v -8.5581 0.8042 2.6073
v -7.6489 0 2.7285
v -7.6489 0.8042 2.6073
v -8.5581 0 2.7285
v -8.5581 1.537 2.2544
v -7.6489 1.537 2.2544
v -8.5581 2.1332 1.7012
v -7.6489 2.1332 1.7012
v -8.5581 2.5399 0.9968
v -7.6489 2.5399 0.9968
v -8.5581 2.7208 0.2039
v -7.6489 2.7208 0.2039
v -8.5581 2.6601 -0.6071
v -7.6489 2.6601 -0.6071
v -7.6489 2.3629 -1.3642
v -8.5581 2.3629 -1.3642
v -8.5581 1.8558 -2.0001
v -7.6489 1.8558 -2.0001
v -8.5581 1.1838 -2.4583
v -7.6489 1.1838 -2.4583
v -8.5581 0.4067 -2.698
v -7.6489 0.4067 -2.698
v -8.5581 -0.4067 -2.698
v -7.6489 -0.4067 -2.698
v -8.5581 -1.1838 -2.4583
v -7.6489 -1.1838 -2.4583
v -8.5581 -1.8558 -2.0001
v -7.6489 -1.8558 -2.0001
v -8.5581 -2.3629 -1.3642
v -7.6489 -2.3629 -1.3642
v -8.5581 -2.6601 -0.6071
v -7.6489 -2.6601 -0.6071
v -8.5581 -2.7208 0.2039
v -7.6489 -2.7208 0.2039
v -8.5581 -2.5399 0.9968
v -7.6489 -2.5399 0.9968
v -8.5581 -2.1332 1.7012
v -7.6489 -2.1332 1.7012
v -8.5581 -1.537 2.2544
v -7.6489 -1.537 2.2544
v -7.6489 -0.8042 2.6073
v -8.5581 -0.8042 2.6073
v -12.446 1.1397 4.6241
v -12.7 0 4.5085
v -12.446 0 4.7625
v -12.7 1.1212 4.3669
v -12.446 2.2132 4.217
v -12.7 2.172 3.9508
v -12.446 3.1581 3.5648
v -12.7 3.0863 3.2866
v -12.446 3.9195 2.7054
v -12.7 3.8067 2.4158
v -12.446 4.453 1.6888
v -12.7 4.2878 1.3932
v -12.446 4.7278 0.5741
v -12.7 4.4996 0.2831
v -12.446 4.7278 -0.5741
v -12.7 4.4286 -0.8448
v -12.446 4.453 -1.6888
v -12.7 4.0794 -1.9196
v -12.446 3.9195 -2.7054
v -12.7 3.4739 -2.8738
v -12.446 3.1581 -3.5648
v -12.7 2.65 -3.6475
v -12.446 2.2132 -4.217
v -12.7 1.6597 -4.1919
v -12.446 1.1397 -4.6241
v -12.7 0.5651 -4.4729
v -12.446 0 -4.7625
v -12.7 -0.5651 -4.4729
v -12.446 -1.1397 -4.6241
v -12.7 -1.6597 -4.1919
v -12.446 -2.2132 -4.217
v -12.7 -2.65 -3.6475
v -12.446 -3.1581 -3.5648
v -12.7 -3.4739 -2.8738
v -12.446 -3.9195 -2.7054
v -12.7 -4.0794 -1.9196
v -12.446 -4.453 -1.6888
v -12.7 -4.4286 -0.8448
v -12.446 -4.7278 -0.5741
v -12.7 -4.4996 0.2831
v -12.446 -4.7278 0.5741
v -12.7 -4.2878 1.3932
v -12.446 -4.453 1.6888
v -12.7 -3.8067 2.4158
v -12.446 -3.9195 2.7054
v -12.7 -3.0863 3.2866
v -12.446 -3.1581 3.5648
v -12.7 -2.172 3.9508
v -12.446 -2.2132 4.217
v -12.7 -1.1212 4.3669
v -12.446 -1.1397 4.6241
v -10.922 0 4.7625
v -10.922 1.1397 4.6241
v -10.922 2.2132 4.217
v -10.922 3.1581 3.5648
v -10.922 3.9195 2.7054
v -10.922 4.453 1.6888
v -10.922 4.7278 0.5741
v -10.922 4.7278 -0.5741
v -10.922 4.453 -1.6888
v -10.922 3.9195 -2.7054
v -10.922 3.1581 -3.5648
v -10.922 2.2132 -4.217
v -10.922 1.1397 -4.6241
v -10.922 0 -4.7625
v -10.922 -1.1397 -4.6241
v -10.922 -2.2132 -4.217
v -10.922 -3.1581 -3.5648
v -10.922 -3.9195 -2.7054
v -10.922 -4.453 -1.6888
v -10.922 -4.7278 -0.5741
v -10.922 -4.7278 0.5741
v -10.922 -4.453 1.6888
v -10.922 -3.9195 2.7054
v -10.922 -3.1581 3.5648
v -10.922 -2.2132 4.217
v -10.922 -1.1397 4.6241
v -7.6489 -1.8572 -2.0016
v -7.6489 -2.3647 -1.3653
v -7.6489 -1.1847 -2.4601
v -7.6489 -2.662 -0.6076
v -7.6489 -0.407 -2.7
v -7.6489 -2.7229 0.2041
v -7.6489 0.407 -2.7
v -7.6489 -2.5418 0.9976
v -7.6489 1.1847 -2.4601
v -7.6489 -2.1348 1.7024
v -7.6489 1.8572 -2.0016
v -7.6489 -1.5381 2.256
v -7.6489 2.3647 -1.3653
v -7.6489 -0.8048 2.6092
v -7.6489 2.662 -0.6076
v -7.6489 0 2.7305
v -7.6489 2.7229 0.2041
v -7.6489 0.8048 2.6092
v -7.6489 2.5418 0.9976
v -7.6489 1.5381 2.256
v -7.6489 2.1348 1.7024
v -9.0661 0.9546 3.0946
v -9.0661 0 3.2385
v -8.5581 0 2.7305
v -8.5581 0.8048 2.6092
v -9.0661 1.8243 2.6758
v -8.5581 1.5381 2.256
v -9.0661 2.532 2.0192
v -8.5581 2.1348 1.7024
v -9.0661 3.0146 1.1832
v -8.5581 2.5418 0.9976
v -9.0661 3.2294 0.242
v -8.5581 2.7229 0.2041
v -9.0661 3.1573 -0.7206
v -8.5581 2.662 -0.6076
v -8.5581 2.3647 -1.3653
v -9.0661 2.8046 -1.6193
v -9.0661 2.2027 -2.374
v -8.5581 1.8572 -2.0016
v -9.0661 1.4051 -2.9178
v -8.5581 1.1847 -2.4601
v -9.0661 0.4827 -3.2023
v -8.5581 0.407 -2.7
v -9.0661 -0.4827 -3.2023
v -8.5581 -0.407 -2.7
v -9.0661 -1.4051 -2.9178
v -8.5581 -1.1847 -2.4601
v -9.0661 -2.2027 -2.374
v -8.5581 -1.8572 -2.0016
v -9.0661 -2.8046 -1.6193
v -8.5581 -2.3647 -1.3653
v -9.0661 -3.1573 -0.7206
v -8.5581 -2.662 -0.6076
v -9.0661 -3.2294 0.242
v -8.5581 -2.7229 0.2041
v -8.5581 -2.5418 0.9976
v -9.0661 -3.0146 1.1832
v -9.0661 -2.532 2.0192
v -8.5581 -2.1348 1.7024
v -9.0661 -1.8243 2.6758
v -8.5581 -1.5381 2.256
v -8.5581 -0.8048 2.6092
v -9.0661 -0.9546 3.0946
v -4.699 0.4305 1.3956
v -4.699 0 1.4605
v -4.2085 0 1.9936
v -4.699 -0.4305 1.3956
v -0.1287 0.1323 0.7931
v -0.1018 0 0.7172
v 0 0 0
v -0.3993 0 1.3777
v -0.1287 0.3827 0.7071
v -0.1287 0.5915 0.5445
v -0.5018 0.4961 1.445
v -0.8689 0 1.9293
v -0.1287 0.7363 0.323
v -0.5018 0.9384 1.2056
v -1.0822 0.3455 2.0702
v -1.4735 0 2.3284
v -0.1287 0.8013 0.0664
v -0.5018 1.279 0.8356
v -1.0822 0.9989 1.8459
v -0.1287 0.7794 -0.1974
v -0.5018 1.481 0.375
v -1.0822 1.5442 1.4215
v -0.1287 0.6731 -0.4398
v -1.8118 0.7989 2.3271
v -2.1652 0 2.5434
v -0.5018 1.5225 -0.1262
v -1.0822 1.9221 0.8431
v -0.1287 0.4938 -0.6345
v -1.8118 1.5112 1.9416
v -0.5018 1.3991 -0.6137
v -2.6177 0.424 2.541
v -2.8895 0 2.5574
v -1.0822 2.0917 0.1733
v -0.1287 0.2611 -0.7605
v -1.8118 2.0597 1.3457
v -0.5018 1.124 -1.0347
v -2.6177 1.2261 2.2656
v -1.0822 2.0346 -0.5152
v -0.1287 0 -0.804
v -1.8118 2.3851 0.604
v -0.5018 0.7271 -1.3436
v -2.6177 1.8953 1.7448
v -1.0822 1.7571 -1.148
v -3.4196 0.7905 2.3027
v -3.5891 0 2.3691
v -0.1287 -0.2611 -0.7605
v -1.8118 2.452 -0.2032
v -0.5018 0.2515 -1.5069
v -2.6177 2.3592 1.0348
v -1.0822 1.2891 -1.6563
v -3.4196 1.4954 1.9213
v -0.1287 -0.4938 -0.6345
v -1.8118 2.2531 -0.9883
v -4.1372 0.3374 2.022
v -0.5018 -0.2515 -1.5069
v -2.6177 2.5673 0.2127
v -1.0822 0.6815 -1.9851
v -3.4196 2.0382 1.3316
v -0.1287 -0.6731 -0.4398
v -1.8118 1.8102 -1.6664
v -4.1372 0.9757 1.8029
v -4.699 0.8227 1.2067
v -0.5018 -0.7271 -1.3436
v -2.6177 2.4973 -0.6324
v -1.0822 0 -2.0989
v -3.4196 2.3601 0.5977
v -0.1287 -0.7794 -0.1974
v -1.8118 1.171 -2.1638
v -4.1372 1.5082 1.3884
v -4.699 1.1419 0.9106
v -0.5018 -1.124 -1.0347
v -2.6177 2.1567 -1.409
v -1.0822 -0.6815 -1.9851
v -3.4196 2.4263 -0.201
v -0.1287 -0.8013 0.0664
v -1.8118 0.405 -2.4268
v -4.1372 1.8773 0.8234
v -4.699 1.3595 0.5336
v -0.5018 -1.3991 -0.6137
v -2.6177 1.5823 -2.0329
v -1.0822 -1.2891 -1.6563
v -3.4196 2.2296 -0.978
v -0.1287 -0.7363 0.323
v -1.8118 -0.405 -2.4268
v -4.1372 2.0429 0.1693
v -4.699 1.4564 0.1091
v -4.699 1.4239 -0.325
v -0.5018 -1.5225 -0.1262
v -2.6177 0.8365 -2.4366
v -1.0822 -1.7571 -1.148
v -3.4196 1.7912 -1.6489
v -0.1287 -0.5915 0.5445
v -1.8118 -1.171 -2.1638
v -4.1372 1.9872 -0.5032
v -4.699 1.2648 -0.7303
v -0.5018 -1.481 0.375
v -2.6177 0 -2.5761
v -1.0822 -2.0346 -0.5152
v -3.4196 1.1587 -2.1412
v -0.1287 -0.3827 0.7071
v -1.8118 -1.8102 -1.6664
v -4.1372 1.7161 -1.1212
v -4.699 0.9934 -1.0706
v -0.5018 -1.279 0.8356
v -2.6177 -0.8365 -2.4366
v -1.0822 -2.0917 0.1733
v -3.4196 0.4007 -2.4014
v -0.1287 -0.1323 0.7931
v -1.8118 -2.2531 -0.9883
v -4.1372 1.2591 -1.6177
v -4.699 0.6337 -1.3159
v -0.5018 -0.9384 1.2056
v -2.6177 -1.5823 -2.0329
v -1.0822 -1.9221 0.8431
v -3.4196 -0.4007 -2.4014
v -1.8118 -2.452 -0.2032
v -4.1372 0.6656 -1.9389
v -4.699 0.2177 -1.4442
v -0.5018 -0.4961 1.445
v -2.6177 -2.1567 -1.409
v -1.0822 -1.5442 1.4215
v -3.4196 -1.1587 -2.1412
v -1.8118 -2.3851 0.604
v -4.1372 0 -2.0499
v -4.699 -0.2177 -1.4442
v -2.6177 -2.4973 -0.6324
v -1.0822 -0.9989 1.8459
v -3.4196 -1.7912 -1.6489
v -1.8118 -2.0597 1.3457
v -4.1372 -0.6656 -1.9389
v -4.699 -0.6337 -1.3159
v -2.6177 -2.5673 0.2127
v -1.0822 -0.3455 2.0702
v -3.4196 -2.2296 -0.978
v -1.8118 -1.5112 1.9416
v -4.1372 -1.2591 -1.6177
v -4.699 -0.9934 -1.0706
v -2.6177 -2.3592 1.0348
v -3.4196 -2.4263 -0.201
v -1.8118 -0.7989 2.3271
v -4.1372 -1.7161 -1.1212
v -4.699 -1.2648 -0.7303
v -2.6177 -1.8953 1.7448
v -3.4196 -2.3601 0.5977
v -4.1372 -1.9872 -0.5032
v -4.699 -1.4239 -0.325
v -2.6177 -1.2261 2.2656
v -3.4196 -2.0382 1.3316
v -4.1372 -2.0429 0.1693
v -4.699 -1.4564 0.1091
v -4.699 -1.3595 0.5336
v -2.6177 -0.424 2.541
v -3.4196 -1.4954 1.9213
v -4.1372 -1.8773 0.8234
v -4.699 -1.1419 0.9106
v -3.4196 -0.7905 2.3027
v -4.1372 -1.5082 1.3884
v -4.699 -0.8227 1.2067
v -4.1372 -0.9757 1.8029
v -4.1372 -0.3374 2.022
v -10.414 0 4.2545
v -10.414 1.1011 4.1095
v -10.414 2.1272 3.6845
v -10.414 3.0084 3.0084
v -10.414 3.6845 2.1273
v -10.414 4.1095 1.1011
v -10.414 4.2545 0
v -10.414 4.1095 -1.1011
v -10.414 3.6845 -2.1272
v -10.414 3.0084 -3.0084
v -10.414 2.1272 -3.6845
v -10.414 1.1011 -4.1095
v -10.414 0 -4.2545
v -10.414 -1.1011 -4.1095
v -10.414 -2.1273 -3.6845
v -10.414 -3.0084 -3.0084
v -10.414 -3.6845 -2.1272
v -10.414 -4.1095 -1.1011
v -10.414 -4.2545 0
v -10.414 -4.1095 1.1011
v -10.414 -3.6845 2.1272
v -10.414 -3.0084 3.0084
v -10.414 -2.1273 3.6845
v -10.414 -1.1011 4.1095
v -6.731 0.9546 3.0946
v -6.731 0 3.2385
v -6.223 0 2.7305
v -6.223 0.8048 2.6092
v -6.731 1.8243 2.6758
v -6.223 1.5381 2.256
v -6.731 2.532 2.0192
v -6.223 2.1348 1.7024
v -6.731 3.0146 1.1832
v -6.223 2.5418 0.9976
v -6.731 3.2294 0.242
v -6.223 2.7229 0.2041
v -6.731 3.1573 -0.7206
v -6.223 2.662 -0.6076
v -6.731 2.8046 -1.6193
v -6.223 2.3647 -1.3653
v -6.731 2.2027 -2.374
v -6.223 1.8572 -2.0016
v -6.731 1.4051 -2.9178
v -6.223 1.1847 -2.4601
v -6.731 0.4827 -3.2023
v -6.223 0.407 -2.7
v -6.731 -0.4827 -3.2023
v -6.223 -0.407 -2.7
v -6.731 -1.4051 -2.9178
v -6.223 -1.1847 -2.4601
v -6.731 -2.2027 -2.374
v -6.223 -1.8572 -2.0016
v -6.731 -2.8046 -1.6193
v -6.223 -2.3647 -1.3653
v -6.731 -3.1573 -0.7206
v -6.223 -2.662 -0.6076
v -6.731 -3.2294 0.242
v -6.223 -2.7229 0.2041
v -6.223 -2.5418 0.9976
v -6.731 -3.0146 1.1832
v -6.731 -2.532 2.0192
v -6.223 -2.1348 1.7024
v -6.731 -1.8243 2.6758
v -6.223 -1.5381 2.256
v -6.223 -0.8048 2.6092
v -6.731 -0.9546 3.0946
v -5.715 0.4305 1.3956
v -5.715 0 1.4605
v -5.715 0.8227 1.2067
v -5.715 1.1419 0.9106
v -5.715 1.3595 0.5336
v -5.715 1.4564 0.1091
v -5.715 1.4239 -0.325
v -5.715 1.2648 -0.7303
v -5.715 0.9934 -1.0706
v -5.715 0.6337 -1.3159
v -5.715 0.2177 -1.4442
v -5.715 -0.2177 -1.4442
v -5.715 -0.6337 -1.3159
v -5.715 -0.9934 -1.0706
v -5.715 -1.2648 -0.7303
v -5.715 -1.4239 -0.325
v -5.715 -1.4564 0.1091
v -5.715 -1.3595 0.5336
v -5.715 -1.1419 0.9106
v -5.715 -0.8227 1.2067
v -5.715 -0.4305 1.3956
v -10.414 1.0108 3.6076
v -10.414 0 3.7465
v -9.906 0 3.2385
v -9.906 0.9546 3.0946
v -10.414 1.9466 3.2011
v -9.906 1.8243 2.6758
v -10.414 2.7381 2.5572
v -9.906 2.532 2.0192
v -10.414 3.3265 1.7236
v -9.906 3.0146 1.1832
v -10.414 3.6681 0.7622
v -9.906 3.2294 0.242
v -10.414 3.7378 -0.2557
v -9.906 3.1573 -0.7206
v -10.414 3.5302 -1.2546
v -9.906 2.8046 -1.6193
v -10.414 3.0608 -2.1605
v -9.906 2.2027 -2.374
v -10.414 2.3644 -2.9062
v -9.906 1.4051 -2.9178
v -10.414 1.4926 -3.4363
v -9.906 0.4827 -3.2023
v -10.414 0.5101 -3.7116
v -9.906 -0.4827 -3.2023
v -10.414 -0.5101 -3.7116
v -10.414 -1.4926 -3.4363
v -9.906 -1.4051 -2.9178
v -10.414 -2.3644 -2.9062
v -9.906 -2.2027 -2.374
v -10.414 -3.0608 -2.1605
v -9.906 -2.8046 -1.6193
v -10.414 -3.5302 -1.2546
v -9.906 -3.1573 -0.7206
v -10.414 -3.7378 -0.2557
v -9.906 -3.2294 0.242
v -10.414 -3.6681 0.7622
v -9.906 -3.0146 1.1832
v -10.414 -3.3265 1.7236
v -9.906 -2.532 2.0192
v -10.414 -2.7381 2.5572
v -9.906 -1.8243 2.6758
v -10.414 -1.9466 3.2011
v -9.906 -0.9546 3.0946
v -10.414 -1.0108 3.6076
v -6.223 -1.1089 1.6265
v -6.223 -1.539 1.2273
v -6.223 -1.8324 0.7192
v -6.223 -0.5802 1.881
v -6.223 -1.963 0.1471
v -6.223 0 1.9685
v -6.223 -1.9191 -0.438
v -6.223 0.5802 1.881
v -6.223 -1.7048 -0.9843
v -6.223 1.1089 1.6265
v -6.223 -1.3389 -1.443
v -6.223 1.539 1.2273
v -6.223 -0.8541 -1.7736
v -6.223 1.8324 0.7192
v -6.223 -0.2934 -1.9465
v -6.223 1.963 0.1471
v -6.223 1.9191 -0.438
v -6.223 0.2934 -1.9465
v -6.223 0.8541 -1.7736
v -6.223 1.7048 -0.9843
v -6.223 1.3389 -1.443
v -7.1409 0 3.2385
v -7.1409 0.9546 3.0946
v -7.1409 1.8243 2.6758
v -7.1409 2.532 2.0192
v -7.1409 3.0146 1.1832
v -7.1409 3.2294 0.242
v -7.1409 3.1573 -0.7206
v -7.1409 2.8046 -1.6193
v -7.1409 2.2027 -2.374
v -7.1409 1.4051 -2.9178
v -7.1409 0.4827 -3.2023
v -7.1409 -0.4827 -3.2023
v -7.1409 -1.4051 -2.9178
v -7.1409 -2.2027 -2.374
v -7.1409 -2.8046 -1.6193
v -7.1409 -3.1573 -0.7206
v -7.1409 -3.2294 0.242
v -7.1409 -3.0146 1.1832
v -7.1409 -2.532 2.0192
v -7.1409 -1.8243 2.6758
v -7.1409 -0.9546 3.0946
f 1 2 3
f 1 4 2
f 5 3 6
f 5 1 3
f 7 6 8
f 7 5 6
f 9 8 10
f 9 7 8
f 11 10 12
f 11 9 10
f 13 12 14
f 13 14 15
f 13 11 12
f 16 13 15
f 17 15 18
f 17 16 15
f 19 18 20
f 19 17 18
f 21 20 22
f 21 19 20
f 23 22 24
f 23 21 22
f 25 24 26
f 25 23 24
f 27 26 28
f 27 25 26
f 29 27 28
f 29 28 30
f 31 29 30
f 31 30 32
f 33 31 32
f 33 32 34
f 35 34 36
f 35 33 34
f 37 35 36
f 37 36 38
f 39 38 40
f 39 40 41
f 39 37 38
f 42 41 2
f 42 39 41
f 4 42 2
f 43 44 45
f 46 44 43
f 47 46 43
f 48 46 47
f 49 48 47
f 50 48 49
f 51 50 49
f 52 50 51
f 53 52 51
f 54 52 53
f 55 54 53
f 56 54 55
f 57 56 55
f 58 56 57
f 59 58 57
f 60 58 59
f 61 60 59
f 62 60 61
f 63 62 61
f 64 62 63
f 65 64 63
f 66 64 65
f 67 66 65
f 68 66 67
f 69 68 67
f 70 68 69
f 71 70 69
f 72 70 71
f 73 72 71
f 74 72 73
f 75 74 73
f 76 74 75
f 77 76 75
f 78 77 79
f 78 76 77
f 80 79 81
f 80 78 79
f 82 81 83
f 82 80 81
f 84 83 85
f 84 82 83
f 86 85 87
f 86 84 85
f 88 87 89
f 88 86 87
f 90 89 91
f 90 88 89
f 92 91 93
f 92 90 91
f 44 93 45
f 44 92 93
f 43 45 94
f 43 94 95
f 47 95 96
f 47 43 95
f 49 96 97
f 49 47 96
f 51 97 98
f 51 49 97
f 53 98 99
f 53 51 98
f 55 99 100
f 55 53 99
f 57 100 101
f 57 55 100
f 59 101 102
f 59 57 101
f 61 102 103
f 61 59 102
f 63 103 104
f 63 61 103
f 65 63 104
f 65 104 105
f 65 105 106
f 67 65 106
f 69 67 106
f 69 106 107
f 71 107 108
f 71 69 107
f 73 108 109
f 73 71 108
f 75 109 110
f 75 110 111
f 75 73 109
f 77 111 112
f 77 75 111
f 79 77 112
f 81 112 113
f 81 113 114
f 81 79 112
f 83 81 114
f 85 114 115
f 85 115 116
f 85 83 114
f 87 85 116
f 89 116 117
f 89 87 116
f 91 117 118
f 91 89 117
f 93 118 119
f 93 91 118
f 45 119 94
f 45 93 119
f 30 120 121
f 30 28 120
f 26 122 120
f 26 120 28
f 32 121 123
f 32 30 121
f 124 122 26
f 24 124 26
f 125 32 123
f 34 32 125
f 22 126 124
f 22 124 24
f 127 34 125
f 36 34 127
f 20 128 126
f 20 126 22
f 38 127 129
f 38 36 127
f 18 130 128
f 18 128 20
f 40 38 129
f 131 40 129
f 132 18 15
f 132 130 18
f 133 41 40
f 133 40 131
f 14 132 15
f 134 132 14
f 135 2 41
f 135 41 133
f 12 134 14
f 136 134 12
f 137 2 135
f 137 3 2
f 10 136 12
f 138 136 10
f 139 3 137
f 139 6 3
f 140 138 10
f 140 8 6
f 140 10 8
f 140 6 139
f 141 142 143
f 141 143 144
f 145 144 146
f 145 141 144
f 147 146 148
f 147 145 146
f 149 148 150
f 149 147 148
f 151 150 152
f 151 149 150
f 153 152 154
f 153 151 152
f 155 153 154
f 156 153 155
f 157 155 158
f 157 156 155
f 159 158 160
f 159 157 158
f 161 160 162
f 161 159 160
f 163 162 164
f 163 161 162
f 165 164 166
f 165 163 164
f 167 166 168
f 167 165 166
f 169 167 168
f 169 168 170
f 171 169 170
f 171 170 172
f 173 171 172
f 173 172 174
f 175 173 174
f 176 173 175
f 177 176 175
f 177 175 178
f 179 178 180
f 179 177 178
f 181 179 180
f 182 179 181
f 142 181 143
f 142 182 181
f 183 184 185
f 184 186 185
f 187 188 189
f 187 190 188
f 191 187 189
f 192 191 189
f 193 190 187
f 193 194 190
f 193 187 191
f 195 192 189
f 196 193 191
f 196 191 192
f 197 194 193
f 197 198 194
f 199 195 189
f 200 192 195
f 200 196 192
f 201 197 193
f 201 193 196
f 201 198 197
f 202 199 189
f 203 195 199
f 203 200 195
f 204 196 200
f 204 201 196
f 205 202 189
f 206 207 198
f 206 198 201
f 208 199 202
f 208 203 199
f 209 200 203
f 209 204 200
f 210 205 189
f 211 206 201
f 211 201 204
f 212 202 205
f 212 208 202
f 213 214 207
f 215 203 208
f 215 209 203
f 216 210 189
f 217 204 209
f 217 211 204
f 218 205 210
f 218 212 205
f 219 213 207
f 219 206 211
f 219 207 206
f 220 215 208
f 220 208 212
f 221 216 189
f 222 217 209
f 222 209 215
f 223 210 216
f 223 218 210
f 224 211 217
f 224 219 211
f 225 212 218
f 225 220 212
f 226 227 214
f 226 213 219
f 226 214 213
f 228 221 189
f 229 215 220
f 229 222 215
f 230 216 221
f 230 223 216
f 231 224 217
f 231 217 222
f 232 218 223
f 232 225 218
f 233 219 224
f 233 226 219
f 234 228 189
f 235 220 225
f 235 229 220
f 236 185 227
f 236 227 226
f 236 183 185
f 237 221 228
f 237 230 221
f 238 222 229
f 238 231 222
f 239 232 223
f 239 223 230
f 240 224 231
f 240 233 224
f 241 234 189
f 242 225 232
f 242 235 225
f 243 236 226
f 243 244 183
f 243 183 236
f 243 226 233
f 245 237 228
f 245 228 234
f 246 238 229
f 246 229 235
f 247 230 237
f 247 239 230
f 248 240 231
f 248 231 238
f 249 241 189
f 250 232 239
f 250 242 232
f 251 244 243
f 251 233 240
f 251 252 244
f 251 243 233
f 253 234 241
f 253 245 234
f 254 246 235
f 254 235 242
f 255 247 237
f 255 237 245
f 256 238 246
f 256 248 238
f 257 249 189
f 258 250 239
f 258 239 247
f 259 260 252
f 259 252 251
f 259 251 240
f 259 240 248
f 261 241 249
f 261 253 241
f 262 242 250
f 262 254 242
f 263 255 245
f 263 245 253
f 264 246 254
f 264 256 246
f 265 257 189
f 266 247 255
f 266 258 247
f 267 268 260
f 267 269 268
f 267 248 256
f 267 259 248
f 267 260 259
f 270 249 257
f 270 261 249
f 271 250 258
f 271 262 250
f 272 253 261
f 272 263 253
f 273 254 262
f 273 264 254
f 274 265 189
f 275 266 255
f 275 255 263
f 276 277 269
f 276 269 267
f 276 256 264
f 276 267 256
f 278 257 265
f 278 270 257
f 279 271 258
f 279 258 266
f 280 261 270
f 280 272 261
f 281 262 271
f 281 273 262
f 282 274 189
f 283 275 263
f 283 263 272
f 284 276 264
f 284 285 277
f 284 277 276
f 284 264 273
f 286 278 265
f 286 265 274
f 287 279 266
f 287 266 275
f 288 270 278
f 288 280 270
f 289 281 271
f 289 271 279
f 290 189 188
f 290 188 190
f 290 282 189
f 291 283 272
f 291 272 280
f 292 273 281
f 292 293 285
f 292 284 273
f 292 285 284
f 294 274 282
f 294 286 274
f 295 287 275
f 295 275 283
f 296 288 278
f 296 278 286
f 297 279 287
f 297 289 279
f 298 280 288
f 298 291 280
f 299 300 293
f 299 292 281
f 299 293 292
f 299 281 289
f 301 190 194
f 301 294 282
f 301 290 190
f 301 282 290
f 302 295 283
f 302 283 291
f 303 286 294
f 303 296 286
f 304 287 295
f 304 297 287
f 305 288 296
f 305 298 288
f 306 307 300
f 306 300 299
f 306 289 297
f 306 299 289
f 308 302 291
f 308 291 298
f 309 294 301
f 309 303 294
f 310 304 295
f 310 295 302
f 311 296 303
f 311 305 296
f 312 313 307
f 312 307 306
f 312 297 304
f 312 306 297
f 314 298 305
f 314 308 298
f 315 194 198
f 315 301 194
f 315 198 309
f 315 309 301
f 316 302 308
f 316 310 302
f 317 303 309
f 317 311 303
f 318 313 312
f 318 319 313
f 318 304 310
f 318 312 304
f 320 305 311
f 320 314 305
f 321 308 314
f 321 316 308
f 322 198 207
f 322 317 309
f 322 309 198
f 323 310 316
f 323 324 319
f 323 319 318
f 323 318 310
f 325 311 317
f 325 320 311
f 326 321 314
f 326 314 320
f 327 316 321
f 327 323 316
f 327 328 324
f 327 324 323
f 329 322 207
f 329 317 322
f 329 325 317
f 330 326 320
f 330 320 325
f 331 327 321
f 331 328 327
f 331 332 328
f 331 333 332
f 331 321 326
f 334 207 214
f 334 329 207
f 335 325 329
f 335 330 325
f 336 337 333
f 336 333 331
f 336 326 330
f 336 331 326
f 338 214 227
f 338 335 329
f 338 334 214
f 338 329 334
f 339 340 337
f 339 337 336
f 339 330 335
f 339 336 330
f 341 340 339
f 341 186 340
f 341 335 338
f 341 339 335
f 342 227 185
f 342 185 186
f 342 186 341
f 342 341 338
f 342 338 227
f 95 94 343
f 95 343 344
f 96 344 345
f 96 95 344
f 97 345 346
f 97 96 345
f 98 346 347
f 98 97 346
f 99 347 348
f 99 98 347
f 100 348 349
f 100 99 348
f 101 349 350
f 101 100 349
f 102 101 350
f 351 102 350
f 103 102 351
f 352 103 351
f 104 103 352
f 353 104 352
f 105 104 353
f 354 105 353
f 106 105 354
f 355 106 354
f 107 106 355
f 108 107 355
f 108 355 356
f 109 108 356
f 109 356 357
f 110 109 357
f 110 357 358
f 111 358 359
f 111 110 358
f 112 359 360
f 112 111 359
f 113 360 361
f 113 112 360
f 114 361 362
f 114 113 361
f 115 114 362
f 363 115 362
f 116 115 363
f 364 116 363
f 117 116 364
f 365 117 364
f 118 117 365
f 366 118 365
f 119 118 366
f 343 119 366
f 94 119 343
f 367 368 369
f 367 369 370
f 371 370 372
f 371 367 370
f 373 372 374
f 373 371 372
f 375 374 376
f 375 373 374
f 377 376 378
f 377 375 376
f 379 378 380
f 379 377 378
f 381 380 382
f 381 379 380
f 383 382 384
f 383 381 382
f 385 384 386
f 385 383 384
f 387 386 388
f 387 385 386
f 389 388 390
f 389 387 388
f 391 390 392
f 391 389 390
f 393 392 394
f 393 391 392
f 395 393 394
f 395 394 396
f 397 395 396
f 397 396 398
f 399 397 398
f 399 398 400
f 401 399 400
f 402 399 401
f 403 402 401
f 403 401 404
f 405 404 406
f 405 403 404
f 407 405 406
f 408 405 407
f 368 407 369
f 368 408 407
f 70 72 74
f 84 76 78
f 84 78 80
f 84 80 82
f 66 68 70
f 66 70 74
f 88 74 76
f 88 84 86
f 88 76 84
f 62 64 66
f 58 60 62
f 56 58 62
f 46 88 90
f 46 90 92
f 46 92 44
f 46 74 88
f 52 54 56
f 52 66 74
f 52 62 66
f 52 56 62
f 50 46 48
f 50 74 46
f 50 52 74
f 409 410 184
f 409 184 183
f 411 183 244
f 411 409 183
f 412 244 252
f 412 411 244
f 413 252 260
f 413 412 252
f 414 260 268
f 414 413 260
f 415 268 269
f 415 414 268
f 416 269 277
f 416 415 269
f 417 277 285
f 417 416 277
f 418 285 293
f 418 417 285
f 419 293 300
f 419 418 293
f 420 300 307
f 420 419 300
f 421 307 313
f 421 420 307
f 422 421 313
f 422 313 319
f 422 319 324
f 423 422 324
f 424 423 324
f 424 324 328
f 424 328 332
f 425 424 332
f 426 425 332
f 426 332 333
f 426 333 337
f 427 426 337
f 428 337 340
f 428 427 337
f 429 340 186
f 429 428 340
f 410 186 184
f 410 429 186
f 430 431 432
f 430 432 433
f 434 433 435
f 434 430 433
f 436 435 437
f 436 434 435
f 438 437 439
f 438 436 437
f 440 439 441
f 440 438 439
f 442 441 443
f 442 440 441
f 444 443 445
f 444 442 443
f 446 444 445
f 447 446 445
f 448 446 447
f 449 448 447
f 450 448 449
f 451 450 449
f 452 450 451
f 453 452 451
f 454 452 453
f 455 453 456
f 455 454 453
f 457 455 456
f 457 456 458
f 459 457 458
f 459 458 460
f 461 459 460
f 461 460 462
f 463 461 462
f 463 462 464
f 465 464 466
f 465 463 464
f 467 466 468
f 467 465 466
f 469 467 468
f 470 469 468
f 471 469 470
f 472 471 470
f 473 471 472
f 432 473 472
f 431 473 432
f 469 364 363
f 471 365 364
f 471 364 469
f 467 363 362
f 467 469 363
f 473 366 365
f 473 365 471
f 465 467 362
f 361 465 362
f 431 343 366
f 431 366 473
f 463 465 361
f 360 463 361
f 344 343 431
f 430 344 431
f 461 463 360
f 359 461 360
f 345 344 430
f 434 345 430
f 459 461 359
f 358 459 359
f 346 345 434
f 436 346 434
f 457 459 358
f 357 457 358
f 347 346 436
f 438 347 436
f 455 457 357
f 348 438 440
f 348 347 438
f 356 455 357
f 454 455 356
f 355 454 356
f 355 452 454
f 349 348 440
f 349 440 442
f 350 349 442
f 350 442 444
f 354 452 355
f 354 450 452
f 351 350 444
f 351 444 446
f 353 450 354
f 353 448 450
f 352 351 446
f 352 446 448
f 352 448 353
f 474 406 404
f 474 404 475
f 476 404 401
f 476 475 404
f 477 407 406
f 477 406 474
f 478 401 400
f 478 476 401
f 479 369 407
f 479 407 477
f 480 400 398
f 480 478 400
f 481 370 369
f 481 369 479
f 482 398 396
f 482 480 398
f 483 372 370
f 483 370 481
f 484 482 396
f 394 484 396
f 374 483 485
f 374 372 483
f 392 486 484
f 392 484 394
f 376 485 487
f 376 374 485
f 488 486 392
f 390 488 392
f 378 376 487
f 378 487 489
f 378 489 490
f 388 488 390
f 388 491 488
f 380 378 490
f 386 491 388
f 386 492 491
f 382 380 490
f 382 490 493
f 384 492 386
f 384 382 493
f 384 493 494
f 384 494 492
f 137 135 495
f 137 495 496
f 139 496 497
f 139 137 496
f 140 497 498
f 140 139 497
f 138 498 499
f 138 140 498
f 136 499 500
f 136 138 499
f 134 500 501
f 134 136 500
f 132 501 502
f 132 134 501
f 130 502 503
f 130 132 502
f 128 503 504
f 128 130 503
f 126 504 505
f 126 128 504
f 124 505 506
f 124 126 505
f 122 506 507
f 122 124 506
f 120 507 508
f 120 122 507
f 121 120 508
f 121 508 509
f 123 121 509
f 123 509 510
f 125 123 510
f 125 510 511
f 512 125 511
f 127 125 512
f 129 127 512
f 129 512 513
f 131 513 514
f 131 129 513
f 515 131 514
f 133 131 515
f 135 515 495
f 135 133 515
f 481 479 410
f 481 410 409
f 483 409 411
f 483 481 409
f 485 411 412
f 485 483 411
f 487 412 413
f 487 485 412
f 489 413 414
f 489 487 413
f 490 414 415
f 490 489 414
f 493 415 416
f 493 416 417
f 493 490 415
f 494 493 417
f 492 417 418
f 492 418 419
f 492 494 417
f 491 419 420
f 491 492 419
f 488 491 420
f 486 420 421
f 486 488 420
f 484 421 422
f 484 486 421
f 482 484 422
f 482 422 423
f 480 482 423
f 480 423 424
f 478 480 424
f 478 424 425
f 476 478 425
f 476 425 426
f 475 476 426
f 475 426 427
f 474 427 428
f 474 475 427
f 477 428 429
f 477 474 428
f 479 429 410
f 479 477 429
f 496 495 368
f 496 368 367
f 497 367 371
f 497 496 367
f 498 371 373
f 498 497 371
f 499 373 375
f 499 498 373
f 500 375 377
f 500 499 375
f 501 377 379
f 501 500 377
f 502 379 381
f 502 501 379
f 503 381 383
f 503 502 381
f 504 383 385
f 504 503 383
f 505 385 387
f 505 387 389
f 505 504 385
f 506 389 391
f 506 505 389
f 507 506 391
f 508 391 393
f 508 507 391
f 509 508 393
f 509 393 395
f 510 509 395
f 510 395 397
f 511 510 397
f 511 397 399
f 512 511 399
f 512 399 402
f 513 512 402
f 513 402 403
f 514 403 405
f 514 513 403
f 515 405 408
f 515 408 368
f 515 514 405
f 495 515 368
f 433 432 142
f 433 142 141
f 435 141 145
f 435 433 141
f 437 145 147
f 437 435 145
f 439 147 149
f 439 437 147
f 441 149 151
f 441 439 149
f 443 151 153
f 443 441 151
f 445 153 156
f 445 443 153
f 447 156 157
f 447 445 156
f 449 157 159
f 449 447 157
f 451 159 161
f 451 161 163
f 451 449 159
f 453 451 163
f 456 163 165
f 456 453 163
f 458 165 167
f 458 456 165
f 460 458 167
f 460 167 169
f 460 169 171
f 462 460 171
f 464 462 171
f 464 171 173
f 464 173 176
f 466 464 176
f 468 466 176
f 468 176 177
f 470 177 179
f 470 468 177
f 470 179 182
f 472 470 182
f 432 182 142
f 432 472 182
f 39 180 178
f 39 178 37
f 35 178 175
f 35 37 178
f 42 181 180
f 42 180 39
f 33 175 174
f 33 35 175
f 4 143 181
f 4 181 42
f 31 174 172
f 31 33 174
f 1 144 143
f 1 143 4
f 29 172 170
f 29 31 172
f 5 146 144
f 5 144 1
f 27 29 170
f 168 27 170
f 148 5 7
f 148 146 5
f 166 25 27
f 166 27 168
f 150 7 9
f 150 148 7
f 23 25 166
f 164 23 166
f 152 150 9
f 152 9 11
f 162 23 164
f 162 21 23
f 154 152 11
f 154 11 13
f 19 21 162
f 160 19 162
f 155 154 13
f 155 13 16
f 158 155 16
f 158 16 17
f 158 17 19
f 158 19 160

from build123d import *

# Parameters (mm, degrees)
F2_SIZE = 0.508
F3_SIZE = 0.254


with BuildPart() as f1:
    # F0 (on Front) → F1 (revolve)
    with BuildSketch(Plane.XZ):
        with BuildLine():
            Line((-12.7, 0), (0, 0))
            ThreePointArc((0, 0), (-1.81176033, 2.4603689383), (-4.699, 1.4605))
            Line((-4.699, 1.4605), (-6.223, 1.4605))
            Line((-6.223, 1.4605), (-6.223, 3.2385))
            Line((-6.223, 3.2385), (-7.6489057392, 3.2385))
            Line((-7.6489057392, 3.2385), (-7.6489057392, 2.7284773532))
            Line((-7.6489057392, 2.7284773532), (-8.558110334, 2.7284773532))
            Line((-8.558110334, 2.7284773532), (-8.558110334, 3.2385))
            Line((-8.558110334, 3.2385), (-10.414, 3.2385))
            Line((-10.414, 3.2385), (-10.414, 4.7625))
            Line((-10.414, 4.7625), (-12.7, 4.7625))
            Line((-12.7, 4.7625), (-12.7, 0))
        make_face()
    revolve(axis=Axis((-6.35, 0, 0), (-1, 0, 0)))

    # F2
    f2_edges = [f1.edges().sort_by_distance(p)[0] for p in [
        (-10.414, 0, -4.7625),
        (-7.648906, 0, -3.2385),
        (-6.223, 0, -1.4605),
        (-6.223, 0, -3.2385),
        (-8.55811, 0, -3.2385),
        (-10.414, 0, -3.2385),
    ]]
    chamfer(f2_edges, length=F2_SIZE)

    # F3
    f3_edges = [f1.edges().sort_by_distance(p)[0] for p in [
        (-12.7, 0, -4.7625),
    ]]
    chamfer(f3_edges, length=F3_SIZE)


solid = f1.part
